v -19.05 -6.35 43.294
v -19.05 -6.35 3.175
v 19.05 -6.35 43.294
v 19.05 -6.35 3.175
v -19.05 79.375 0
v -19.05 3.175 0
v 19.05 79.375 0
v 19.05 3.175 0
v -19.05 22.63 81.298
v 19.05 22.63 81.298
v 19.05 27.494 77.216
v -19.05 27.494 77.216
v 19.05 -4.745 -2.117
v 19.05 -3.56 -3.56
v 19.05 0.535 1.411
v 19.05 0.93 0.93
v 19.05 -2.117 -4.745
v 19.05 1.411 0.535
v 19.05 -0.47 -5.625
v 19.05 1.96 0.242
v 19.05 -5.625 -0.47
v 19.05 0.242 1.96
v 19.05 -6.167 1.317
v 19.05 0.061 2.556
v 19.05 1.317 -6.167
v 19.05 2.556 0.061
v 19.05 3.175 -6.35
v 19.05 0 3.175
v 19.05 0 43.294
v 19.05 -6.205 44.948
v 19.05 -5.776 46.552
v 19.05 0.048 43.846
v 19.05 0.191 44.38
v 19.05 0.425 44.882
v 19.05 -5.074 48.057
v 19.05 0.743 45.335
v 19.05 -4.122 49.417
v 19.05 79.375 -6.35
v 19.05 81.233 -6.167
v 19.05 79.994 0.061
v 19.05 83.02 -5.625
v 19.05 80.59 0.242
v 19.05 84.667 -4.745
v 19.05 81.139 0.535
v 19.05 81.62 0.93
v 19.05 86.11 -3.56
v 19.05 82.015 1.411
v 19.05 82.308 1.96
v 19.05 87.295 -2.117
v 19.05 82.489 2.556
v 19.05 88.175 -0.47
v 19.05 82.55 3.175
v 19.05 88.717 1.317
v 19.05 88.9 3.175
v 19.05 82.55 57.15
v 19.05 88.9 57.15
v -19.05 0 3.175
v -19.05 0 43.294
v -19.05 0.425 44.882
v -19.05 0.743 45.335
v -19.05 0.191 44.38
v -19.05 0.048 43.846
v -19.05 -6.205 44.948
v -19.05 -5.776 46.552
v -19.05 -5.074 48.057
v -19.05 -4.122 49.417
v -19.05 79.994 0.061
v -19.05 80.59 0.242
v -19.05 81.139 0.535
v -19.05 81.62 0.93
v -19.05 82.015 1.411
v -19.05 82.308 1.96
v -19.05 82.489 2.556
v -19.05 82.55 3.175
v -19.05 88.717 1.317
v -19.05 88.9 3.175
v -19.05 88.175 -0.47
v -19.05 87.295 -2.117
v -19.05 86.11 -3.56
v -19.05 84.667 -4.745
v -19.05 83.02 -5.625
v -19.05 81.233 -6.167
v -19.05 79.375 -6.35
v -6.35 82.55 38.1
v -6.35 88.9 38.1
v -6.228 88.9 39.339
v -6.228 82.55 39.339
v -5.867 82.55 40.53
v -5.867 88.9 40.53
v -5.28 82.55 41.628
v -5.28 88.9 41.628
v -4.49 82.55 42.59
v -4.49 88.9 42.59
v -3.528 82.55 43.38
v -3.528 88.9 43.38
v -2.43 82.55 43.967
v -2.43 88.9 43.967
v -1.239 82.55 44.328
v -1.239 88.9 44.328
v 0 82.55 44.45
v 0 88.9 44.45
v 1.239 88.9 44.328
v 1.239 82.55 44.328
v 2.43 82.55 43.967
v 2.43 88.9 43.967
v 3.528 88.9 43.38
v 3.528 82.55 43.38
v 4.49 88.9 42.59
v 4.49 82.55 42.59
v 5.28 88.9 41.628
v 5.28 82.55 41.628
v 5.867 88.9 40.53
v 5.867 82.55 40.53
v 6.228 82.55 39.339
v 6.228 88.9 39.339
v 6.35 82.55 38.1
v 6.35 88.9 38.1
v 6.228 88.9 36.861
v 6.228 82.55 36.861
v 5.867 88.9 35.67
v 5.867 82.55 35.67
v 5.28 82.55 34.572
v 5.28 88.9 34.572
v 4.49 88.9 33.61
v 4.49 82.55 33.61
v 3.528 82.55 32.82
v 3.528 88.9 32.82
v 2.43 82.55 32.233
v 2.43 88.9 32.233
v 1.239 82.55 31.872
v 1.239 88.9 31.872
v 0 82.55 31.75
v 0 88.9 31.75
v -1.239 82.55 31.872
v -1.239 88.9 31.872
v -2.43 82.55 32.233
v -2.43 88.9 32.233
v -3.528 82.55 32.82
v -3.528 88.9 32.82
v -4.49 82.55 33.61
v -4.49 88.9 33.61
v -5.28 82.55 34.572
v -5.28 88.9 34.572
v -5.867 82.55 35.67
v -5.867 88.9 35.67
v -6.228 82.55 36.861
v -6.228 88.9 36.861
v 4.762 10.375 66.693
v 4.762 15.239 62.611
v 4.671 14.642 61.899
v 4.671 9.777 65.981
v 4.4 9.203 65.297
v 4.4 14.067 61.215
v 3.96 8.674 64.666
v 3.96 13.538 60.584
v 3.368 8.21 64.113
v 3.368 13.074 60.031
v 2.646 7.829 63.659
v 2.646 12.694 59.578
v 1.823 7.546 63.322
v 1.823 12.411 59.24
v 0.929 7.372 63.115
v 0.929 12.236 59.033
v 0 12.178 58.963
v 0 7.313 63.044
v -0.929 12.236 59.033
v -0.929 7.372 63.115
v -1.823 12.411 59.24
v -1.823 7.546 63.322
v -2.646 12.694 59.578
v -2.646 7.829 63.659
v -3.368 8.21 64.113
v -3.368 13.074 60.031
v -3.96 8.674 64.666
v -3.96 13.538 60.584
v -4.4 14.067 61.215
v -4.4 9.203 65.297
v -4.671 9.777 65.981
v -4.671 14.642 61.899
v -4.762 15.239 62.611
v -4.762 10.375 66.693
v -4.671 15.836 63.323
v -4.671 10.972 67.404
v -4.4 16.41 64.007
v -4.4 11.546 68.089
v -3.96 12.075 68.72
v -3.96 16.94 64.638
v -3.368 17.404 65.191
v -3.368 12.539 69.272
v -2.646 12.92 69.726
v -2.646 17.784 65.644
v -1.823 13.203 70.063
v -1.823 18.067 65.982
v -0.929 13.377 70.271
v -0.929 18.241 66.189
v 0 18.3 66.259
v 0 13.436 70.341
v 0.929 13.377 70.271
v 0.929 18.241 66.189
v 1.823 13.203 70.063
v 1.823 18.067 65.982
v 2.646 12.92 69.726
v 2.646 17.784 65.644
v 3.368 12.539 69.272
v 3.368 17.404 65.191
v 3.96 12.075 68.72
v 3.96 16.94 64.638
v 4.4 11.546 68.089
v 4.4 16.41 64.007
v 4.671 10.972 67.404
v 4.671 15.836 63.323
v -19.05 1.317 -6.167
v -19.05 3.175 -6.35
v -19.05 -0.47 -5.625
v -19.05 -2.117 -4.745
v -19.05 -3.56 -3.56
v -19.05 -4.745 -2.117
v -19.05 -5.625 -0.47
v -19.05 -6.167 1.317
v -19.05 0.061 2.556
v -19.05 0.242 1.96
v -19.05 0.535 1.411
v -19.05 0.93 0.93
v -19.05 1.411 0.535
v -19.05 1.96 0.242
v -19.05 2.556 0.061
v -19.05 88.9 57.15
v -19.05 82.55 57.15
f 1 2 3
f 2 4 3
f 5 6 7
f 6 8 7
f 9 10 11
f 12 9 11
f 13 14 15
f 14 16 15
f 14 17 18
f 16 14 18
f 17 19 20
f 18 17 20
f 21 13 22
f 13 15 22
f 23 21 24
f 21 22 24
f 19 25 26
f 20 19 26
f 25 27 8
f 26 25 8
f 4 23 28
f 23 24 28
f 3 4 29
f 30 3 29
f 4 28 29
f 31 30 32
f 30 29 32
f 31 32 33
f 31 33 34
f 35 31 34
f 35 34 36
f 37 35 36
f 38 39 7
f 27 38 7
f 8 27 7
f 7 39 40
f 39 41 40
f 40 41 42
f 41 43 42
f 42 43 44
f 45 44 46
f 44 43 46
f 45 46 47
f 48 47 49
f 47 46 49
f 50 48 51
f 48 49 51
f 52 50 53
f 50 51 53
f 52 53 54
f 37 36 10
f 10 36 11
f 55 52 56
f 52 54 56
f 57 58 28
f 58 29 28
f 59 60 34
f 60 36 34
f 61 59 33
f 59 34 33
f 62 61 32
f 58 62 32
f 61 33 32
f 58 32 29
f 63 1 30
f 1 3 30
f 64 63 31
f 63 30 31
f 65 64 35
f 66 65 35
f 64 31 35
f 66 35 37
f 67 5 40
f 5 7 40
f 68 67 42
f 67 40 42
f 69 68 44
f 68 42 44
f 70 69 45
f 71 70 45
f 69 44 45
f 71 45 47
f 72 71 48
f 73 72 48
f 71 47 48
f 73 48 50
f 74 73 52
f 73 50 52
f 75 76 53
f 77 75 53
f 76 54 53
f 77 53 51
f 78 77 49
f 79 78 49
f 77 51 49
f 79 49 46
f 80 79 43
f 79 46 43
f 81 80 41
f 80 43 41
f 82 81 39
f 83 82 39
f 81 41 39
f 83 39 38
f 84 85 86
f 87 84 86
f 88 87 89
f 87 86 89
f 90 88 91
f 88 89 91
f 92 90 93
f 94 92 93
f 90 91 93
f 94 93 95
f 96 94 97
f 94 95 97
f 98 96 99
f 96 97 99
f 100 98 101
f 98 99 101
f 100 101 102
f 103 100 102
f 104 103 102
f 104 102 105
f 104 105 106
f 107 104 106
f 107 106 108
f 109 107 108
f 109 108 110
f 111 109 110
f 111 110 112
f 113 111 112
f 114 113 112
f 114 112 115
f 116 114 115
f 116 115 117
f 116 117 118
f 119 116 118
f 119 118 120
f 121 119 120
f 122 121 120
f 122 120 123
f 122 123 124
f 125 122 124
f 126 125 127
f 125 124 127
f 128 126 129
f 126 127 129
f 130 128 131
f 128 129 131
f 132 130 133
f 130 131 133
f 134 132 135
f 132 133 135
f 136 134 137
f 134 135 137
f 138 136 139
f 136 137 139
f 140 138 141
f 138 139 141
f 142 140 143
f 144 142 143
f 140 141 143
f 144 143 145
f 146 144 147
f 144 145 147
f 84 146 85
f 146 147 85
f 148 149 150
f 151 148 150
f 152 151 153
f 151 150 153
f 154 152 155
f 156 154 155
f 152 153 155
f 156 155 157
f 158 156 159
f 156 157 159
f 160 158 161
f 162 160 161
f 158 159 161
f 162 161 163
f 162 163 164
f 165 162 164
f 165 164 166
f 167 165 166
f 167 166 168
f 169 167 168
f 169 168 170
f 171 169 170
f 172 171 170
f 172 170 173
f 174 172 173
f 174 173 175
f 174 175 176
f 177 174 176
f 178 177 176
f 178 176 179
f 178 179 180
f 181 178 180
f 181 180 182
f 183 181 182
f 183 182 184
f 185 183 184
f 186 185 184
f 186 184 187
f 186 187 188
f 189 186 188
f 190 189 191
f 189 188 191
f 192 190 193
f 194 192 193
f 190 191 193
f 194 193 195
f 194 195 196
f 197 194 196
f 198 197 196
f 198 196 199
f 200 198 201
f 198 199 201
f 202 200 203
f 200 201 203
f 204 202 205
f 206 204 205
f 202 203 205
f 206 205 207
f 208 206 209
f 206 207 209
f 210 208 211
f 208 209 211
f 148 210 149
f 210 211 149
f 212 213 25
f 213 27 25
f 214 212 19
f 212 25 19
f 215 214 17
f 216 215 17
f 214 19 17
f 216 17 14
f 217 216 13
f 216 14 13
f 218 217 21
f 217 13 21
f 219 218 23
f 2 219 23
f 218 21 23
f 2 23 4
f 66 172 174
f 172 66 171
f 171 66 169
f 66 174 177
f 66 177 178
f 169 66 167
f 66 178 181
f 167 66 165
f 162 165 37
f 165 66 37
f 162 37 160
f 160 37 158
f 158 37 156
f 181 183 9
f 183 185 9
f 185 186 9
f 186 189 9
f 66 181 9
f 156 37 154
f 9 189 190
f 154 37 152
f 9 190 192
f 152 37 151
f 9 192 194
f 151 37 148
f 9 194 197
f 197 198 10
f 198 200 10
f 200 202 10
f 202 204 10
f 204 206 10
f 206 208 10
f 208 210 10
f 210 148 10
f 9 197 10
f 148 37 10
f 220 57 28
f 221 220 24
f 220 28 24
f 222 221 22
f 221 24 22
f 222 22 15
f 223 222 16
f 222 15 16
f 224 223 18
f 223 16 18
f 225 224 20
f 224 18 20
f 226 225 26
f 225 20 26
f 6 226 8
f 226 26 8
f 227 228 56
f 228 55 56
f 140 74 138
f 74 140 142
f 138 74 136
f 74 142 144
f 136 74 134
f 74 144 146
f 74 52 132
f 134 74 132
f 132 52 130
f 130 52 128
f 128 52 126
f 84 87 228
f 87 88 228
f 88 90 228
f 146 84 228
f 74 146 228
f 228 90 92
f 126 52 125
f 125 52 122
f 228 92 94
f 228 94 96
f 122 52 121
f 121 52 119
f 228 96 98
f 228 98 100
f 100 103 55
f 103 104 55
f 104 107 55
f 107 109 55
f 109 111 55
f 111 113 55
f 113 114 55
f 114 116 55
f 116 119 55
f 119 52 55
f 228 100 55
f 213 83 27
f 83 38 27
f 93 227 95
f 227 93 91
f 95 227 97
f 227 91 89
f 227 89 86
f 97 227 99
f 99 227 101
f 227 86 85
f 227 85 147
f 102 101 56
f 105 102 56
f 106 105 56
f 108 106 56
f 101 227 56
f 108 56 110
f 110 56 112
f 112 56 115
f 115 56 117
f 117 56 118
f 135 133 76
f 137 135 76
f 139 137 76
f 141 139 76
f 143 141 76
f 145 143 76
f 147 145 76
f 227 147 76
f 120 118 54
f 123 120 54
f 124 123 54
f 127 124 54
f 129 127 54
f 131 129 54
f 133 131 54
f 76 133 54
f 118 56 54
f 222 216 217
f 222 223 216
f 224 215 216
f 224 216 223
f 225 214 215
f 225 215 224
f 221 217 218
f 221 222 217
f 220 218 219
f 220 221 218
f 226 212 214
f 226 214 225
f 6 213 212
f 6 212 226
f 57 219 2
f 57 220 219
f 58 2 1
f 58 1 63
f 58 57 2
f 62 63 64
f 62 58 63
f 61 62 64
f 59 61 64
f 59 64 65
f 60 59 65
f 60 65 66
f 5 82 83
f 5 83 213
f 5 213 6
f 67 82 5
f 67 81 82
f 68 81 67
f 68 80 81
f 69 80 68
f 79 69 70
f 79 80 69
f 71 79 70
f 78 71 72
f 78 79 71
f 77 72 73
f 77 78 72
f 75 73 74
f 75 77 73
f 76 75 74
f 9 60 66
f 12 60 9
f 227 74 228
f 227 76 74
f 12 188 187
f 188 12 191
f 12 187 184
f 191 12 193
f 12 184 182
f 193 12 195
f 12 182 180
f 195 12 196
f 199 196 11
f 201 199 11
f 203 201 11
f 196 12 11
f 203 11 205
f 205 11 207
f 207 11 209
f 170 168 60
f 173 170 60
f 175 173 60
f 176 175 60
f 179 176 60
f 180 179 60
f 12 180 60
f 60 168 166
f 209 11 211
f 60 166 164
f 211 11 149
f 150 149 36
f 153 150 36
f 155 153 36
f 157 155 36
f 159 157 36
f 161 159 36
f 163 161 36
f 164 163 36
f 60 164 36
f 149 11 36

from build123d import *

# Parameters (mm, degrees)
BASE_EXTRUDE_THIN_DEPTH = 19.05
CUT_EXTRUDE1_REACH      = 97.25
SKETCH2_R               = 6.35
SKETCH3_R               = 4.7625
CUT_EXTRUDE2_DEPTH      = 29.549935702


with BuildPart() as part:
    # Sketch1 → Base-Extrude-Thin (new body, symmetric)
    with BuildSketch(Plane(origin=(0, 0, 0), x_dir=(0, 0, -1), z_dir=(1, 0, 0))):
        with BuildLine():
            Line((-77.216478592, 27.494340102), (-45.335245167, 0.742808893))
            ThreePointArc((-45.335245167, 0.742808893), (-44.380308461, 0.191475929), (-43.294394506, 0))
            Line((-43.294394506, 0), (-3.175, 0))
            ThreePointArc((-3.175, 0), (-0.92993597, 0.92993597), (0, 3.175))
            Line((0, 3.175), (0, 79.375))
            ThreePointArc((0, 79.375), (-0.92993597, 81.62006403), (-3.175, 82.55))
            Line((-3.175, 82.55), (-57.15, 82.55))
            Line((-57.15, 82.55), (-57.15, 88.9))
            Line((-57.15, 88.9), (-3.175, 88.9))
            ThreePointArc((-3.175, 88.9), (3.560192091, 86.110192091), (6.35, 79.375))
            Line((6.35, 79.375), (6.35, 3.175))
            ThreePointArc((6.35, 3.175), (3.560192091, -3.560192091), (-3.175, -6.35))
            Line((-3.175, -6.35), (-43.294394506, -6.35))
            ThreePointArc((-43.294394506, -6.35), (-46.552136371, -5.775572213), (-49.416946488, -4.121573321))
            Line((-49.416946488, -4.121573321), (-81.298179914, 22.629957888))
            Line((-81.298179914, 22.629957888), (-77.216478592, 27.494340102))
        make_face()
    extrude(amount=BASE_EXTRUDE_THIN_DEPTH, both=True)

    # Sketch2 → Cut-Extrude1 (cut, up to next)
    with BuildSketch(Plane(origin=(0, 88.9, 0), x_dir=(-1, 0, 0), z_dir=(0, 1, 0)), mode=Mode.PRIVATE) as cut_extrude1_sk1:
        with Locations((0, 38.1)):
            Circle(SKETCH2_R)
    cut_extrude1_tool1 = extrude(cut_extrude1_sk1.sketch, amount=-CUT_EXTRUDE1_REACH, mode=Mode.PRIVATE) & part.part
    add(cut_extrude1_tool1.solids().sort_by_distance((0, 88.9, 38.1))[0], mode=Mode.SUBTRACT)

    # Sketch3 → Cut-Extrude2 (cut, through all)
    with BuildSketch(Plane(origin=(0, -21.887352311, 18.365669251), x_dir=(1, 0, 0), z_dir=(0, 0.766044443, -0.64278761))):
        with Locations((0, -57.758202533)):
            Circle(SKETCH3_R)
    extrude(amount=-CUT_EXTRUDE2_DEPTH, mode=Mode.SUBTRACT)


solid = part.part
